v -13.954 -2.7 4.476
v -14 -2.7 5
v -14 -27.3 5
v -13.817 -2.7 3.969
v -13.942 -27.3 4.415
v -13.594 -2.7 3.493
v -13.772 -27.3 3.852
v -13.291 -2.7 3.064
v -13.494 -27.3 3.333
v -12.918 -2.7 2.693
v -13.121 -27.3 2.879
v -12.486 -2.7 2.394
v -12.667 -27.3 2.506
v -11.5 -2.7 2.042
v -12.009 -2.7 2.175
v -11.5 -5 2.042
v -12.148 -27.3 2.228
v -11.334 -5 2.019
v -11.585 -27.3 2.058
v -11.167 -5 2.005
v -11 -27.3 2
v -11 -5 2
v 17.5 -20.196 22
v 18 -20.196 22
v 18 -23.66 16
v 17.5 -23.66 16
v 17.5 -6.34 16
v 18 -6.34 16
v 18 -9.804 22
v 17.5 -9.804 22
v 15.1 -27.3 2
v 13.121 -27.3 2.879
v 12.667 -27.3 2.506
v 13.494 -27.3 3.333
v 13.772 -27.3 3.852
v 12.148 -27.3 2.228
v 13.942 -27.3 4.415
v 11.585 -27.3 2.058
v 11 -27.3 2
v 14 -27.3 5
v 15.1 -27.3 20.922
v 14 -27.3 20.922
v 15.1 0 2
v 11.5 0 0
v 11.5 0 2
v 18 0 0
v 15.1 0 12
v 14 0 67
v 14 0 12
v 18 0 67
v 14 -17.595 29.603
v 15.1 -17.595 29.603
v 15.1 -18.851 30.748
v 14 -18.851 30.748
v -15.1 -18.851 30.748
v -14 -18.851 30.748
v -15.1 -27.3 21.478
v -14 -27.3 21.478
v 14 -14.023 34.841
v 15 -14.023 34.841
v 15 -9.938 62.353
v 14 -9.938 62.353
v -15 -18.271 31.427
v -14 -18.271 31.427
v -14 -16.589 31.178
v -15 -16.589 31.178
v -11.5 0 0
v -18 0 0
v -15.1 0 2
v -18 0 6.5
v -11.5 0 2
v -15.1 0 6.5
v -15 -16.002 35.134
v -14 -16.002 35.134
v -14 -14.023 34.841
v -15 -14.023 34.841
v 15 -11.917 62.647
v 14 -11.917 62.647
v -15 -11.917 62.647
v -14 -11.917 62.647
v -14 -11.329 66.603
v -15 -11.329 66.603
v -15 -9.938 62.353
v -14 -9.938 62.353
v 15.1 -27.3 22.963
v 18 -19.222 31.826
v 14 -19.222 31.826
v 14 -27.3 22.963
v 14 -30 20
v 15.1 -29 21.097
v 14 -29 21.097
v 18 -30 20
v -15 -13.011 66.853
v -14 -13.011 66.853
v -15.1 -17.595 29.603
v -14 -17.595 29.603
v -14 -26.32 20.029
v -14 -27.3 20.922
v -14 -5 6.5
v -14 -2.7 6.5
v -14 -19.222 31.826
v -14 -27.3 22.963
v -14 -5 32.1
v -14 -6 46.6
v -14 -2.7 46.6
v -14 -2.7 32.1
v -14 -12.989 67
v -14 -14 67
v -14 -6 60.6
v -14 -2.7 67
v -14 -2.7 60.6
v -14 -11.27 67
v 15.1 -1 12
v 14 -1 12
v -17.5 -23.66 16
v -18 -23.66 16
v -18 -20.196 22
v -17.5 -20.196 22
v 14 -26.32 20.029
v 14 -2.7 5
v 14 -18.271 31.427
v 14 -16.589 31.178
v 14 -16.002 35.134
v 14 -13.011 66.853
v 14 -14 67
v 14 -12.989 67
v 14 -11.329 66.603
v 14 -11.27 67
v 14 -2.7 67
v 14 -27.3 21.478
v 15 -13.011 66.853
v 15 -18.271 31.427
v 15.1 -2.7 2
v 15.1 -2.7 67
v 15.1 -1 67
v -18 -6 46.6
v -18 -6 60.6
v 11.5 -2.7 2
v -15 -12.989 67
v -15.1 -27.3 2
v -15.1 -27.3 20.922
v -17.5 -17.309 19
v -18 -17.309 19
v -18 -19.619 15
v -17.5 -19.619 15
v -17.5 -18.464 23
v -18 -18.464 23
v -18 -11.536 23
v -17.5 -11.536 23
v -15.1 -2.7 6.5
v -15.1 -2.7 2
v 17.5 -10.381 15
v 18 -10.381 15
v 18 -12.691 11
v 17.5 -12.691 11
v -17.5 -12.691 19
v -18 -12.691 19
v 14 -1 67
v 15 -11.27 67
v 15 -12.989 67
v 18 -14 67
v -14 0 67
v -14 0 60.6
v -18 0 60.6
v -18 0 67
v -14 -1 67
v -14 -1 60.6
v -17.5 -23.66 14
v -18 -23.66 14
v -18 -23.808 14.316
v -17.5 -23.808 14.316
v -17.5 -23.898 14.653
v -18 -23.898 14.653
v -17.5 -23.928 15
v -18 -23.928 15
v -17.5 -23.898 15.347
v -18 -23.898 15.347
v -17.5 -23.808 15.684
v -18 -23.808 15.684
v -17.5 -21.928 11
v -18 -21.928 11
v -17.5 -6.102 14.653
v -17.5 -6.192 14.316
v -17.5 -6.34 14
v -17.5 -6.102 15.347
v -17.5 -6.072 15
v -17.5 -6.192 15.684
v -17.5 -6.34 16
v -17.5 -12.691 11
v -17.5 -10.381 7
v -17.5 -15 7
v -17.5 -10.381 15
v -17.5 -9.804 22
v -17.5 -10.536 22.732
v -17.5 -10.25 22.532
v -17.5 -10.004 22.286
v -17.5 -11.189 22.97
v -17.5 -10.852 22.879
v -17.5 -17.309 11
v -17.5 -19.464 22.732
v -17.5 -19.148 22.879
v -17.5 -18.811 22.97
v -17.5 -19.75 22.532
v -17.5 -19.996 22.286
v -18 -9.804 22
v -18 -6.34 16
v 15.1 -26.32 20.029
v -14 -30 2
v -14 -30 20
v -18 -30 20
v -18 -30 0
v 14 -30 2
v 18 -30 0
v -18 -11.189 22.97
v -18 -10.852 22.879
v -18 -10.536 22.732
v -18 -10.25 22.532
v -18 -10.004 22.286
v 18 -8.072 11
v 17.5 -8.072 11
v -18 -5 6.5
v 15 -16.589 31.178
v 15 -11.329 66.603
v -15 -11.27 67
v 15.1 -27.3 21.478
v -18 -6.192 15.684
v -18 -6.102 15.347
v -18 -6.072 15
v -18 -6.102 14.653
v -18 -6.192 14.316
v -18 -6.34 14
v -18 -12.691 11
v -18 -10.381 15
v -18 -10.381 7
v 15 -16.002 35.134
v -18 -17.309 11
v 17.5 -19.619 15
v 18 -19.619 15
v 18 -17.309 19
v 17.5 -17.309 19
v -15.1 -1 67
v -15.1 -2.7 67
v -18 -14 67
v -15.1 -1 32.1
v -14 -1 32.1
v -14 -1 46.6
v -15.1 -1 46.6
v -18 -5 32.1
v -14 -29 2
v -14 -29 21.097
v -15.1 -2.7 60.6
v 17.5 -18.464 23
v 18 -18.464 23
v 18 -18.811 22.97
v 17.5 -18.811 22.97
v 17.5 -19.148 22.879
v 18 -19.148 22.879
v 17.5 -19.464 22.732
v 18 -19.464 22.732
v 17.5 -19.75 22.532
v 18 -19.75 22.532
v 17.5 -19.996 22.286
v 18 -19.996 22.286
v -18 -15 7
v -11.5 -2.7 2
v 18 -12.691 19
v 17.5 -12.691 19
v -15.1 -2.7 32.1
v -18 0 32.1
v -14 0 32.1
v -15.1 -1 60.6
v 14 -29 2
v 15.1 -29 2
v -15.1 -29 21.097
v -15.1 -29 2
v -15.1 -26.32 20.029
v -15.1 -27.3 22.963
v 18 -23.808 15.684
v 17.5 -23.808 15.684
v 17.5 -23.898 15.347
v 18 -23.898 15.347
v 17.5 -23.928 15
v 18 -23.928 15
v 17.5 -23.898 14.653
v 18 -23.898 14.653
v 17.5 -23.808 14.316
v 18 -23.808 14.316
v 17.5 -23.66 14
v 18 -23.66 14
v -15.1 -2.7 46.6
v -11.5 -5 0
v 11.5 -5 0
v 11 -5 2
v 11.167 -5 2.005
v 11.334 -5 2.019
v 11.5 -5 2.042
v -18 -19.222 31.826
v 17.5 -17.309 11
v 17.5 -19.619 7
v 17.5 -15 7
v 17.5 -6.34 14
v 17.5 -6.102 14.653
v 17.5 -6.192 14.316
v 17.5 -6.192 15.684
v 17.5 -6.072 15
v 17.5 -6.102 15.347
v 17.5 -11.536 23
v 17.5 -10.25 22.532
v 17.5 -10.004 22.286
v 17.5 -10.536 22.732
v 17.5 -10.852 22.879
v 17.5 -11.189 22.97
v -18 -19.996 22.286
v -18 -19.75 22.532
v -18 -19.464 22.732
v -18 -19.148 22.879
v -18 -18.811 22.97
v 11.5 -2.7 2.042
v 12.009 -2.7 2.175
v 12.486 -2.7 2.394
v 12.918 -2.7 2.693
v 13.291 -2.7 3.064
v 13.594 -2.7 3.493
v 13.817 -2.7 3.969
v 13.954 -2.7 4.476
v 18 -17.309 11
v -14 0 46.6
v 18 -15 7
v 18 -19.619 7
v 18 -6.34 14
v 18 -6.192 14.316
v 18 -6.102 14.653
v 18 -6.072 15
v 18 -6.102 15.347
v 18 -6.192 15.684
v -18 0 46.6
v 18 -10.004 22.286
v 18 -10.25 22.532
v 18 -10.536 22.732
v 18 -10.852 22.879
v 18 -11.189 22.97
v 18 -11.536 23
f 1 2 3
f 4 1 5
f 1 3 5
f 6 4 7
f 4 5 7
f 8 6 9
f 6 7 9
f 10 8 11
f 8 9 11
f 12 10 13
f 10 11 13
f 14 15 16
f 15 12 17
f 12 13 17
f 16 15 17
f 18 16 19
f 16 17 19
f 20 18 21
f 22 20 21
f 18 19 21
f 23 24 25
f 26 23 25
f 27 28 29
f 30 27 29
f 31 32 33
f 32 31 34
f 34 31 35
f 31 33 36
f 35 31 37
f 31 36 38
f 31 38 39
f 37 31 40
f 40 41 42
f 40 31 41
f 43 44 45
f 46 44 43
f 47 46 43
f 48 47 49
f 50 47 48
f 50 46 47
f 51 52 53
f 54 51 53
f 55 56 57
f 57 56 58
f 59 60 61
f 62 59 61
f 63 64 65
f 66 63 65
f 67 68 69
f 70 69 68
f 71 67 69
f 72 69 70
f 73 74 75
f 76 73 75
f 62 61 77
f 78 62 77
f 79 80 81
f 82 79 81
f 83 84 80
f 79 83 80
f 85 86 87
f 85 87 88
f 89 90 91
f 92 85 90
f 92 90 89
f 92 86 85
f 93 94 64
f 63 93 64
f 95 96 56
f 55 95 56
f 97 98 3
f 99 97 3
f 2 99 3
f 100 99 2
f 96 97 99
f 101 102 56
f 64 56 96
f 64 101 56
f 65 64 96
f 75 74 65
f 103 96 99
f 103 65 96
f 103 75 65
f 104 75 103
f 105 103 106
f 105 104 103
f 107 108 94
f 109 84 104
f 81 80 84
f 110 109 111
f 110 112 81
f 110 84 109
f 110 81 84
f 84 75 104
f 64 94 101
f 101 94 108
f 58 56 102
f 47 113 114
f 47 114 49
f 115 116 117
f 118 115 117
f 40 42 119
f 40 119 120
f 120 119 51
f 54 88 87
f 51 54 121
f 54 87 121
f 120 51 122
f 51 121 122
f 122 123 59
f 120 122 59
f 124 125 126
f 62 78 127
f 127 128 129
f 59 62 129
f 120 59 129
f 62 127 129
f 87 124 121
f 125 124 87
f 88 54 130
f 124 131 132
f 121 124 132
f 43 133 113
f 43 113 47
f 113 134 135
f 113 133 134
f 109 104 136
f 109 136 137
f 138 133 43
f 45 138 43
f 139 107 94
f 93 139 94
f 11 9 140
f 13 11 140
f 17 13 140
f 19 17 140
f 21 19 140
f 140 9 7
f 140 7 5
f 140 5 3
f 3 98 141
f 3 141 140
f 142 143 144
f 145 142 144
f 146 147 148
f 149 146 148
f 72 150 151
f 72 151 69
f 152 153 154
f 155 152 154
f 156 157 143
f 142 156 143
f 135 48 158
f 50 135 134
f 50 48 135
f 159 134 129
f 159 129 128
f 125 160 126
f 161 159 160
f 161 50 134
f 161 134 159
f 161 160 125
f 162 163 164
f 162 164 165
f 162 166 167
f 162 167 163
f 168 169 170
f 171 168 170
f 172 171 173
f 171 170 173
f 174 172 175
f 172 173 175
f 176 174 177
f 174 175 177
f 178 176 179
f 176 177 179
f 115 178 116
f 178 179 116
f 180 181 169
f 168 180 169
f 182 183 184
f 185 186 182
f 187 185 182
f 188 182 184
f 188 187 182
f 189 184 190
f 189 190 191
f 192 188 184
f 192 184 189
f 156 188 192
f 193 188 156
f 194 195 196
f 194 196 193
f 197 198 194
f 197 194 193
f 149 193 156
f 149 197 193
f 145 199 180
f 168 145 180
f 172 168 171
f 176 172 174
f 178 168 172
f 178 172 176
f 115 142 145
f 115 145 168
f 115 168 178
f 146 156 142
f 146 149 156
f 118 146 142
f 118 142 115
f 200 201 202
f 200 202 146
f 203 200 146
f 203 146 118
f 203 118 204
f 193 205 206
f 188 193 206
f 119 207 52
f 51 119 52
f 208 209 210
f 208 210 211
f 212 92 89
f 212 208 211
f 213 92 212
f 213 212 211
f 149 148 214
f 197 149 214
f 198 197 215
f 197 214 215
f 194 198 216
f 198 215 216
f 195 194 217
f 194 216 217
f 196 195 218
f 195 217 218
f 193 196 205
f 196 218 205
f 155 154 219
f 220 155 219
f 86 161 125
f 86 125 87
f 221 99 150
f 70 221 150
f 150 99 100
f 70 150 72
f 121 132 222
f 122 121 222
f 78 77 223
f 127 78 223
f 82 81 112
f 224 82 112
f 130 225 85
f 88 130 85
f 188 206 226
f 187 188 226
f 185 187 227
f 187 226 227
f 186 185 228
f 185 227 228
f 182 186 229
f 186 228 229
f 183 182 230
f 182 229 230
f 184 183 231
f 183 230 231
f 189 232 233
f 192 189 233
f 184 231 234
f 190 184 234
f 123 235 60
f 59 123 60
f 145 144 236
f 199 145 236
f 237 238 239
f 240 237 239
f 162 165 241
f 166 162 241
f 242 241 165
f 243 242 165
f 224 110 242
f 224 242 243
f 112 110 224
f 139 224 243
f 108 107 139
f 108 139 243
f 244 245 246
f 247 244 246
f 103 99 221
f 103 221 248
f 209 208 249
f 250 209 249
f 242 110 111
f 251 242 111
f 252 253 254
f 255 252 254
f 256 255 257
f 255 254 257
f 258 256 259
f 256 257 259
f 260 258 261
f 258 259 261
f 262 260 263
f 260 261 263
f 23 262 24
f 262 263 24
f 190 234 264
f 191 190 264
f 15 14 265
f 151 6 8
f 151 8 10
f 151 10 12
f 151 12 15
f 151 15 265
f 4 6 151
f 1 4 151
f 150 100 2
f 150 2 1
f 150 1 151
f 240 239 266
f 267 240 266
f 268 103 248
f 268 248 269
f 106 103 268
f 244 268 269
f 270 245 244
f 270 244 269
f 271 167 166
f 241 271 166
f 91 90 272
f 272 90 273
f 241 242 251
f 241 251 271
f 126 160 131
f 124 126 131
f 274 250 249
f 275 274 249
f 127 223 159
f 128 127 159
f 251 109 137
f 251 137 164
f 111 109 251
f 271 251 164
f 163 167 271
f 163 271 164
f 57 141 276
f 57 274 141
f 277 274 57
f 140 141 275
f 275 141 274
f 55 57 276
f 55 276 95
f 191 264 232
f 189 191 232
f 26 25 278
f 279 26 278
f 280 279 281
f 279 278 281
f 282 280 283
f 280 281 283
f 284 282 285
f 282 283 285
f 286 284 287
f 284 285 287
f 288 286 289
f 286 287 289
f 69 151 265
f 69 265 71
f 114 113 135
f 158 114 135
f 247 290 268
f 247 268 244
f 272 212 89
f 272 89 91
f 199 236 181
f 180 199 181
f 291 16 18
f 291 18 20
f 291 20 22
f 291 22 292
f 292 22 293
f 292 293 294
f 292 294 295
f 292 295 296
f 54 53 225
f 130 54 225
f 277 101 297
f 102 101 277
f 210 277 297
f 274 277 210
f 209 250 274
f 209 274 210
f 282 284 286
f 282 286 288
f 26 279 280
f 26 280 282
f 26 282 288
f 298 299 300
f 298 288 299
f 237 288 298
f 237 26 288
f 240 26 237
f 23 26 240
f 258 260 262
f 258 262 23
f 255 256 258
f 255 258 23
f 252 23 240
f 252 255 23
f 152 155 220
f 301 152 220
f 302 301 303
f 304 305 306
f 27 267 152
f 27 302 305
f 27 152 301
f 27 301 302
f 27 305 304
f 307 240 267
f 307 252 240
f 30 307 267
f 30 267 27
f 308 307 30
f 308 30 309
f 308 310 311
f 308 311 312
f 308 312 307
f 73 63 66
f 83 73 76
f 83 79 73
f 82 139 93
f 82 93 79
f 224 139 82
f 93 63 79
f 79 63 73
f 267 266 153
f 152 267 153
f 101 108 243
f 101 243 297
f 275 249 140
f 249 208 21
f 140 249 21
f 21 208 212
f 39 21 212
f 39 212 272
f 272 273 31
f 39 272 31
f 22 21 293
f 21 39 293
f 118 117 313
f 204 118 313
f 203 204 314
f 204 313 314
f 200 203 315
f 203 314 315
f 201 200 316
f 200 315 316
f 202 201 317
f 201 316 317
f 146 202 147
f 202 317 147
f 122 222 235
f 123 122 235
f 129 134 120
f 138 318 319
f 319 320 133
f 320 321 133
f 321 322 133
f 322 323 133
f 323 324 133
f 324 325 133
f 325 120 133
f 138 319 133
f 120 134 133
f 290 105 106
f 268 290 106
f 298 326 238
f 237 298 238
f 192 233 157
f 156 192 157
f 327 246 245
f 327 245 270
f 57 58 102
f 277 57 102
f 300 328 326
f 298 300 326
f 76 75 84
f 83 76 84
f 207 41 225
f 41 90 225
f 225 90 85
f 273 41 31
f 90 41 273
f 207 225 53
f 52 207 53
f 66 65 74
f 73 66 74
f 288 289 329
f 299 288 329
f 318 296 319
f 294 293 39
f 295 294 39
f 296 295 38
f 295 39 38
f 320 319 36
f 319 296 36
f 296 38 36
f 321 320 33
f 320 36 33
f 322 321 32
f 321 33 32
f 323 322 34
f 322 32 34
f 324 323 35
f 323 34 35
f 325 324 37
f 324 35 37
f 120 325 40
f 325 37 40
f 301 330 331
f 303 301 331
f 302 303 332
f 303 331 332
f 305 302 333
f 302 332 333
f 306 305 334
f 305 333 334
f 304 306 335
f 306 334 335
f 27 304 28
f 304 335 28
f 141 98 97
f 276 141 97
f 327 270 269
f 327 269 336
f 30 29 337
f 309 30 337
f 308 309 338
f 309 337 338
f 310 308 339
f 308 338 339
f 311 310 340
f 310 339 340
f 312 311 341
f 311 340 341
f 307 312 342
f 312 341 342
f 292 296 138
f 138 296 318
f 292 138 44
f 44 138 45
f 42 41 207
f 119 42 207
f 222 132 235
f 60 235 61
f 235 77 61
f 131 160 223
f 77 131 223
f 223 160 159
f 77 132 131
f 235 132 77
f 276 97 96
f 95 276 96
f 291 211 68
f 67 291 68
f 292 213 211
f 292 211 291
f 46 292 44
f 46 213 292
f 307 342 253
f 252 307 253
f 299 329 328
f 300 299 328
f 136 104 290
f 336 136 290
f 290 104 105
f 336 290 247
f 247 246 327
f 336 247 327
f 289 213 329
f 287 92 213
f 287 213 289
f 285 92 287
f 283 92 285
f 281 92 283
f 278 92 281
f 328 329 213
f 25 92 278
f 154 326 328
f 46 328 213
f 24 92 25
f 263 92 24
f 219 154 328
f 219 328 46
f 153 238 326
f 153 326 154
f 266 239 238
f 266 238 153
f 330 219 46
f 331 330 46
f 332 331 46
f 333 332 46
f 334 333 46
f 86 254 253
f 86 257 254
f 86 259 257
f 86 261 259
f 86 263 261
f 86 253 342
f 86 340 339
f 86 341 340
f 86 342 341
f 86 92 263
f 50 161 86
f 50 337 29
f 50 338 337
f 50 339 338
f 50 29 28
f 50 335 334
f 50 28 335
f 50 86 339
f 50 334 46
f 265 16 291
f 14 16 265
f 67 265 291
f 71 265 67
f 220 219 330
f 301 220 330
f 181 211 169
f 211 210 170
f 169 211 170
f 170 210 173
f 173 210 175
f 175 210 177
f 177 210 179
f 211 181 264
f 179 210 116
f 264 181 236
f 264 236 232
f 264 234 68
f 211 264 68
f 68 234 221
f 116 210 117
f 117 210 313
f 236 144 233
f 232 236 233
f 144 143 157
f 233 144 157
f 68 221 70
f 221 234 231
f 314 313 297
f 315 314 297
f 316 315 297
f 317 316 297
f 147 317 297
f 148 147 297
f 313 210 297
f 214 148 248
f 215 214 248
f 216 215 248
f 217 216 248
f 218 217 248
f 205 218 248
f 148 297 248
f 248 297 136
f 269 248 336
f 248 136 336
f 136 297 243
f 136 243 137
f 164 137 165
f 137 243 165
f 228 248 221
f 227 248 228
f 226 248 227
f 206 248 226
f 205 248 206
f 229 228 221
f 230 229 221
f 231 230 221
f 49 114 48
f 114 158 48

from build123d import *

# Parameters (mm, degrees)
F1_DEPTH     = 18
F2_W         = 30
F2_H         = 80
F3_DEPTH     = 14
F4_W         = 5
F4_H         = 25.6
F4_W_2       = 6
F4_H_2       = 14
F5_DEPTH     = 25
F6_W         = 5
F6_H         = 5
F7_DEPTH     = 11.5
F8_W         = 10
F8_H         = 10
F9_DEPTH     = 15.1
F10_W        = 1.7
F10_H        = 17.78
F10_H_2      = 10
F11_DEPTH    = 15.1
F13_DEPTH    = 15.1
F15_DEPTH    = 15
F17_DEPTH    = 0.5
F19_DEPTH    = 0.5
F20_T4_DEPTH = 32.1
F20_T9_DEPTH = 32.1
F21_T4_DEPTH = 32.1
F21_T9_DEPTH = 24.6


# Not quite as in the source:
# - a fillet or chamfer that OpenCascade refuses, or shapes differently, is made with other operations: its cross-section is extruded or revolved along the edge and cut away or added


with BuildPart() as f1:
    # F0 (on Right) → F1 (new body, symmetric)
    with BuildSketch(Plane.YZ):
        Polygon((-30, 0), (0, 0), (0, 67), (-14, 67), (-19.2224497622, 31.8255828978), (-30, 20), align=None)
    extrude(amount=F1_DEPTH, both=True)

    # F2 (on Right) → F3 (cut, symmetric)
    with BuildSketch(Plane.YZ):
        with Locations((-15, 42)):
            Rectangle(F2_W, F2_H)
    extrude(amount=F3_DEPTH, both=True, mode=Mode.SUBTRACT)

    # F4 (on Right) → F5 (cut)
    with BuildSketch(Plane.YZ):
        with Locations((-2.5, 19.3)):
            Rectangle(F4_W, F4_H)
        with Locations((-3, 53.6)):
            Rectangle(F4_W_2, F4_H_2)
    extrude(amount=-F5_DEPTH, mode=Mode.SUBTRACT)

    # F6 (on Right) → F7 (cut, symmetric)
    with BuildSketch(Plane.YZ):
        with Locations((-2.5, 2.5)):
            Rectangle(F6_W, F6_H)
    extrude(amount=F7_DEPTH, both=True, mode=Mode.SUBTRACT)

    # F8 (on Right) → F9 (cut, symmetric)
    with BuildSketch(Plane.YZ):
        Polygon((-2.7, 67), (-2.7, 2), (-1, 2), (-1, 12), (-1, 67), align=None)
        with Locations((4, 7)):
            Rectangle(F8_W, F8_H)
    extrude(amount=F9_DEPTH, both=True, mode=Mode.SUBTRACT)

    # F10 (on Right) → F11 (cut, symmetric)
    with BuildSketch(Plane.YZ):
        with Locations((-28.15, 10.89)):
            Rectangle(F10_W, F10_H)
        with Locations((-28.15, 24.78)):
            Rectangle(F10_W, F10_H_2)
    extrude(amount=F11_DEPTH, both=True, mode=Mode.SUBTRACT)

    # F12 (on Right) → F13 (cut, symmetric)
    with BuildSketch(Plane.YZ):
        Polygon((-17.5946665501, 29.6033232788), (-18.851134733, 30.7484379915), (-27.5769088442, 21.1741504379), (-26.3204406613, 20.0290357252), align=None)
    extrude(amount=F13_DEPTH, both=True, mode=Mode.SUBTRACT)

    # F14 (on Right) → F15 (cut, symmetric)
    with BuildSketch(Plane.YZ):
        Polygon((-11.9167287085, 62.6468424419), (-11.3292765417, 66.6034697875), (-13.0108431636, 66.8531369583), (-18.2705961384, 31.4274740197), (-16.5890295165, 31.1778068488), (-16.0015773498, 35.1344341944), align=None)
        Polygon((-13.0108431636, 66.8531369583), (-11.3292765417, 66.6034697875), (-9.8606461249, 76.4950381514), (-11.5422127468, 76.7447053223), align=None)
        Polygon((-9.9384150357, 62.3531163585), (-11.9167287085, 62.6468424419), (-16.0015773498, 35.1344341944), (-14.023263677, 34.840708111), align=None)
    extrude(amount=F15_DEPTH, both=True, mode=Mode.SUBTRACT)

    # F16 (on face) → F17 (cut)
    with BuildSketch(Plane.YZ.offset(18)):
        with BuildLine():
            Line((-19.6188021535, 7), (-15, 7))
            Line((-15, 7), (-17.3094010768, 11))
            Line((-17.3094010768, 11), (-19.6188021535, 15))
            Line((-19.6188021535, 15), (-17.3094010768, 19))
            Line((-17.3094010768, 19), (-12.6905989232, 19))
            Line((-12.6905989232, 19), (-10.3811978465, 15))
            Line((-10.3811978465, 15), (-12.6905989232, 11))
            Line((-12.6905989232, 11), (-8.0717967697, 11))
            Line((-8.0717967697, 11), (-6.3397459622, 14))
            ThreePointArc((-6.3397459622, 14), (-6.0717967697, 15), (-6.3397459622, 16))
            Line((-6.3397459622, 16), (-9.8038475773, 22))
            ThreePointArc((-9.8038475773, 22), (-10.5358983849, 22.7320508076), (-11.5358983849, 23))
            Line((-11.5358983849, 23), (-18.4641016151, 23))
            ThreePointArc((-18.4641016151, 23), (-19.4641016151, 22.7320508076), (-20.1961524227, 22))
            Line((-20.1961524227, 22), (-23.6602540378, 16))
            ThreePointArc((-23.6602540378, 16), (-23.9282032303, 15), (-23.6602540378, 14))
            Line((-23.6602540378, 14), (-19.6188021535, 7))
        make_face()
    extrude(amount=-F17_DEPTH, mode=Mode.SUBTRACT)

    # F18 (on face) → F19 (cut)
    with BuildSketch(Plane(origin=(-18, 0, 0), x_dir=(0, -1, 0), z_dir=(-1, 0, 0))):
        with BuildLine():
            Line((18.4641016151, 23), (11.5358983849, 23))
            ThreePointArc((11.5358983849, 23), (10.5358983849, 22.7320508076), (9.8038475773, 22))
            Line((9.8038475773, 22), (6.3397459622, 16))
            ThreePointArc((6.3397459622, 16), (6.0717967697, 15), (6.3397459622, 14))
            Line((6.3397459622, 14), (10.3811978465, 7))
            Line((10.3811978465, 7), (15, 7))
            Line((15, 7), (12.6905989232, 11))
            Line((12.6905989232, 11), (10.3811978465, 15))
            Line((10.3811978465, 15), (12.6905989232, 19))
            Line((12.6905989232, 19), (17.3094010768, 19))
            Line((17.3094010768, 19), (19.6188021535, 15))
            Line((19.6188021535, 15), (17.3094010768, 11))
            Line((17.3094010768, 11), (21.9282032303, 11))
            Line((21.9282032303, 11), (23.6602540378, 14))
            ThreePointArc((23.6602540378, 14), (23.9282032303, 15), (23.6602540378, 16))
            Line((23.6602540378, 16), (20.1961524227, 22))
            ThreePointArc((20.1961524227, 22), (19.4641016151, 22.7320508076), (18.4641016151, 23))
        make_face()
    extrude(amount=-F19_DEPTH, mode=Mode.SUBTRACT)

    # F20: fillet of radius 3 on 1 edges, made by hand


with BuildPart() as f20_tool2:
    # F20_s3 → F20_t4 (new body)
    with BuildSketch(Plane.XZ.offset(27.3)):
        with BuildLine():
            ThreePointArc((-14, 5), (-13.1213203436, 2.8786796564), (-11, 2))
            Line((-11, 2), (-14, 2))
            Line((-14, 2), (-14, 5))
        make_face()
    extrude(amount=-F20_T4_DEPTH)

    split(bisect_by=Plane.XZ.offset(5), keep=Keep.TOP)


with BuildPart() as f1_1:
    add(f1.part)

    # F20_t1: union F20_tool2
    add(f20_tool2.part)


with BuildPart() as f20_tool7:
    # F20_s8 → F20_t9 (new body)
    with BuildSketch(Plane.XZ.offset(34.8)):
        with BuildLine():
            ThreePointArc((-14, 5), (-13.1213203436, 2.8786796564), (-11, 2))
            Line((-11, 2), (-14, 2))
            Line((-14, 2), (-14, 5))
        make_face()
    extrude(amount=-F20_T9_DEPTH)

    split(bisect_by=Plane.YZ.offset(-11.5), keep=Keep.BOTTOM)

    split(bisect_by=Plane.XZ.offset(5), keep=Keep.BOTTOM)


with BuildPart() as f1_2:
    add(f1_1.part)

    # F20_t6: union F20_tool7
    add(f20_tool7.part)

    # F21: fillet of radius 3 on 1 edges, made by hand


with BuildPart() as f21_tool2:
    # F21_s3 → F21_t4 (new body)
    with BuildSketch(Plane.XZ.offset(27.3)):
        with BuildLine():
            ThreePointArc((11, 2), (13.1213203436, 2.8786796564), (14, 5))
            Line((14, 5), (14, 2))
            Line((14, 2), (11, 2))
        make_face()
    extrude(amount=-F21_T4_DEPTH)

    split(bisect_by=Plane.XZ.offset(5), keep=Keep.TOP)


with BuildPart() as f1_3:
    add(f1_2.part)

    # F21_t1: union F21_tool2
    add(f21_tool2.part)


with BuildPart() as f21_tool7:
    # F21_s8 → F21_t9 (new body)
    with BuildSketch(Plane.XZ.offset(27.3)):
        with BuildLine():
            ThreePointArc((11, 2), (13.1213203436, 2.8786796564), (14, 5))
            Line((14, 5), (14, 2))
            Line((14, 2), (11, 2))
        make_face()
    extrude(amount=-F21_T9_DEPTH)

    split(bisect_by=Plane.YZ.offset(11.5), keep=Keep.TOP)


with BuildPart() as f1_4:
    add(f1_3.part)

    # F21_t6: union F21_tool7
    add(f21_tool7.part)


solid = f1_4.part
